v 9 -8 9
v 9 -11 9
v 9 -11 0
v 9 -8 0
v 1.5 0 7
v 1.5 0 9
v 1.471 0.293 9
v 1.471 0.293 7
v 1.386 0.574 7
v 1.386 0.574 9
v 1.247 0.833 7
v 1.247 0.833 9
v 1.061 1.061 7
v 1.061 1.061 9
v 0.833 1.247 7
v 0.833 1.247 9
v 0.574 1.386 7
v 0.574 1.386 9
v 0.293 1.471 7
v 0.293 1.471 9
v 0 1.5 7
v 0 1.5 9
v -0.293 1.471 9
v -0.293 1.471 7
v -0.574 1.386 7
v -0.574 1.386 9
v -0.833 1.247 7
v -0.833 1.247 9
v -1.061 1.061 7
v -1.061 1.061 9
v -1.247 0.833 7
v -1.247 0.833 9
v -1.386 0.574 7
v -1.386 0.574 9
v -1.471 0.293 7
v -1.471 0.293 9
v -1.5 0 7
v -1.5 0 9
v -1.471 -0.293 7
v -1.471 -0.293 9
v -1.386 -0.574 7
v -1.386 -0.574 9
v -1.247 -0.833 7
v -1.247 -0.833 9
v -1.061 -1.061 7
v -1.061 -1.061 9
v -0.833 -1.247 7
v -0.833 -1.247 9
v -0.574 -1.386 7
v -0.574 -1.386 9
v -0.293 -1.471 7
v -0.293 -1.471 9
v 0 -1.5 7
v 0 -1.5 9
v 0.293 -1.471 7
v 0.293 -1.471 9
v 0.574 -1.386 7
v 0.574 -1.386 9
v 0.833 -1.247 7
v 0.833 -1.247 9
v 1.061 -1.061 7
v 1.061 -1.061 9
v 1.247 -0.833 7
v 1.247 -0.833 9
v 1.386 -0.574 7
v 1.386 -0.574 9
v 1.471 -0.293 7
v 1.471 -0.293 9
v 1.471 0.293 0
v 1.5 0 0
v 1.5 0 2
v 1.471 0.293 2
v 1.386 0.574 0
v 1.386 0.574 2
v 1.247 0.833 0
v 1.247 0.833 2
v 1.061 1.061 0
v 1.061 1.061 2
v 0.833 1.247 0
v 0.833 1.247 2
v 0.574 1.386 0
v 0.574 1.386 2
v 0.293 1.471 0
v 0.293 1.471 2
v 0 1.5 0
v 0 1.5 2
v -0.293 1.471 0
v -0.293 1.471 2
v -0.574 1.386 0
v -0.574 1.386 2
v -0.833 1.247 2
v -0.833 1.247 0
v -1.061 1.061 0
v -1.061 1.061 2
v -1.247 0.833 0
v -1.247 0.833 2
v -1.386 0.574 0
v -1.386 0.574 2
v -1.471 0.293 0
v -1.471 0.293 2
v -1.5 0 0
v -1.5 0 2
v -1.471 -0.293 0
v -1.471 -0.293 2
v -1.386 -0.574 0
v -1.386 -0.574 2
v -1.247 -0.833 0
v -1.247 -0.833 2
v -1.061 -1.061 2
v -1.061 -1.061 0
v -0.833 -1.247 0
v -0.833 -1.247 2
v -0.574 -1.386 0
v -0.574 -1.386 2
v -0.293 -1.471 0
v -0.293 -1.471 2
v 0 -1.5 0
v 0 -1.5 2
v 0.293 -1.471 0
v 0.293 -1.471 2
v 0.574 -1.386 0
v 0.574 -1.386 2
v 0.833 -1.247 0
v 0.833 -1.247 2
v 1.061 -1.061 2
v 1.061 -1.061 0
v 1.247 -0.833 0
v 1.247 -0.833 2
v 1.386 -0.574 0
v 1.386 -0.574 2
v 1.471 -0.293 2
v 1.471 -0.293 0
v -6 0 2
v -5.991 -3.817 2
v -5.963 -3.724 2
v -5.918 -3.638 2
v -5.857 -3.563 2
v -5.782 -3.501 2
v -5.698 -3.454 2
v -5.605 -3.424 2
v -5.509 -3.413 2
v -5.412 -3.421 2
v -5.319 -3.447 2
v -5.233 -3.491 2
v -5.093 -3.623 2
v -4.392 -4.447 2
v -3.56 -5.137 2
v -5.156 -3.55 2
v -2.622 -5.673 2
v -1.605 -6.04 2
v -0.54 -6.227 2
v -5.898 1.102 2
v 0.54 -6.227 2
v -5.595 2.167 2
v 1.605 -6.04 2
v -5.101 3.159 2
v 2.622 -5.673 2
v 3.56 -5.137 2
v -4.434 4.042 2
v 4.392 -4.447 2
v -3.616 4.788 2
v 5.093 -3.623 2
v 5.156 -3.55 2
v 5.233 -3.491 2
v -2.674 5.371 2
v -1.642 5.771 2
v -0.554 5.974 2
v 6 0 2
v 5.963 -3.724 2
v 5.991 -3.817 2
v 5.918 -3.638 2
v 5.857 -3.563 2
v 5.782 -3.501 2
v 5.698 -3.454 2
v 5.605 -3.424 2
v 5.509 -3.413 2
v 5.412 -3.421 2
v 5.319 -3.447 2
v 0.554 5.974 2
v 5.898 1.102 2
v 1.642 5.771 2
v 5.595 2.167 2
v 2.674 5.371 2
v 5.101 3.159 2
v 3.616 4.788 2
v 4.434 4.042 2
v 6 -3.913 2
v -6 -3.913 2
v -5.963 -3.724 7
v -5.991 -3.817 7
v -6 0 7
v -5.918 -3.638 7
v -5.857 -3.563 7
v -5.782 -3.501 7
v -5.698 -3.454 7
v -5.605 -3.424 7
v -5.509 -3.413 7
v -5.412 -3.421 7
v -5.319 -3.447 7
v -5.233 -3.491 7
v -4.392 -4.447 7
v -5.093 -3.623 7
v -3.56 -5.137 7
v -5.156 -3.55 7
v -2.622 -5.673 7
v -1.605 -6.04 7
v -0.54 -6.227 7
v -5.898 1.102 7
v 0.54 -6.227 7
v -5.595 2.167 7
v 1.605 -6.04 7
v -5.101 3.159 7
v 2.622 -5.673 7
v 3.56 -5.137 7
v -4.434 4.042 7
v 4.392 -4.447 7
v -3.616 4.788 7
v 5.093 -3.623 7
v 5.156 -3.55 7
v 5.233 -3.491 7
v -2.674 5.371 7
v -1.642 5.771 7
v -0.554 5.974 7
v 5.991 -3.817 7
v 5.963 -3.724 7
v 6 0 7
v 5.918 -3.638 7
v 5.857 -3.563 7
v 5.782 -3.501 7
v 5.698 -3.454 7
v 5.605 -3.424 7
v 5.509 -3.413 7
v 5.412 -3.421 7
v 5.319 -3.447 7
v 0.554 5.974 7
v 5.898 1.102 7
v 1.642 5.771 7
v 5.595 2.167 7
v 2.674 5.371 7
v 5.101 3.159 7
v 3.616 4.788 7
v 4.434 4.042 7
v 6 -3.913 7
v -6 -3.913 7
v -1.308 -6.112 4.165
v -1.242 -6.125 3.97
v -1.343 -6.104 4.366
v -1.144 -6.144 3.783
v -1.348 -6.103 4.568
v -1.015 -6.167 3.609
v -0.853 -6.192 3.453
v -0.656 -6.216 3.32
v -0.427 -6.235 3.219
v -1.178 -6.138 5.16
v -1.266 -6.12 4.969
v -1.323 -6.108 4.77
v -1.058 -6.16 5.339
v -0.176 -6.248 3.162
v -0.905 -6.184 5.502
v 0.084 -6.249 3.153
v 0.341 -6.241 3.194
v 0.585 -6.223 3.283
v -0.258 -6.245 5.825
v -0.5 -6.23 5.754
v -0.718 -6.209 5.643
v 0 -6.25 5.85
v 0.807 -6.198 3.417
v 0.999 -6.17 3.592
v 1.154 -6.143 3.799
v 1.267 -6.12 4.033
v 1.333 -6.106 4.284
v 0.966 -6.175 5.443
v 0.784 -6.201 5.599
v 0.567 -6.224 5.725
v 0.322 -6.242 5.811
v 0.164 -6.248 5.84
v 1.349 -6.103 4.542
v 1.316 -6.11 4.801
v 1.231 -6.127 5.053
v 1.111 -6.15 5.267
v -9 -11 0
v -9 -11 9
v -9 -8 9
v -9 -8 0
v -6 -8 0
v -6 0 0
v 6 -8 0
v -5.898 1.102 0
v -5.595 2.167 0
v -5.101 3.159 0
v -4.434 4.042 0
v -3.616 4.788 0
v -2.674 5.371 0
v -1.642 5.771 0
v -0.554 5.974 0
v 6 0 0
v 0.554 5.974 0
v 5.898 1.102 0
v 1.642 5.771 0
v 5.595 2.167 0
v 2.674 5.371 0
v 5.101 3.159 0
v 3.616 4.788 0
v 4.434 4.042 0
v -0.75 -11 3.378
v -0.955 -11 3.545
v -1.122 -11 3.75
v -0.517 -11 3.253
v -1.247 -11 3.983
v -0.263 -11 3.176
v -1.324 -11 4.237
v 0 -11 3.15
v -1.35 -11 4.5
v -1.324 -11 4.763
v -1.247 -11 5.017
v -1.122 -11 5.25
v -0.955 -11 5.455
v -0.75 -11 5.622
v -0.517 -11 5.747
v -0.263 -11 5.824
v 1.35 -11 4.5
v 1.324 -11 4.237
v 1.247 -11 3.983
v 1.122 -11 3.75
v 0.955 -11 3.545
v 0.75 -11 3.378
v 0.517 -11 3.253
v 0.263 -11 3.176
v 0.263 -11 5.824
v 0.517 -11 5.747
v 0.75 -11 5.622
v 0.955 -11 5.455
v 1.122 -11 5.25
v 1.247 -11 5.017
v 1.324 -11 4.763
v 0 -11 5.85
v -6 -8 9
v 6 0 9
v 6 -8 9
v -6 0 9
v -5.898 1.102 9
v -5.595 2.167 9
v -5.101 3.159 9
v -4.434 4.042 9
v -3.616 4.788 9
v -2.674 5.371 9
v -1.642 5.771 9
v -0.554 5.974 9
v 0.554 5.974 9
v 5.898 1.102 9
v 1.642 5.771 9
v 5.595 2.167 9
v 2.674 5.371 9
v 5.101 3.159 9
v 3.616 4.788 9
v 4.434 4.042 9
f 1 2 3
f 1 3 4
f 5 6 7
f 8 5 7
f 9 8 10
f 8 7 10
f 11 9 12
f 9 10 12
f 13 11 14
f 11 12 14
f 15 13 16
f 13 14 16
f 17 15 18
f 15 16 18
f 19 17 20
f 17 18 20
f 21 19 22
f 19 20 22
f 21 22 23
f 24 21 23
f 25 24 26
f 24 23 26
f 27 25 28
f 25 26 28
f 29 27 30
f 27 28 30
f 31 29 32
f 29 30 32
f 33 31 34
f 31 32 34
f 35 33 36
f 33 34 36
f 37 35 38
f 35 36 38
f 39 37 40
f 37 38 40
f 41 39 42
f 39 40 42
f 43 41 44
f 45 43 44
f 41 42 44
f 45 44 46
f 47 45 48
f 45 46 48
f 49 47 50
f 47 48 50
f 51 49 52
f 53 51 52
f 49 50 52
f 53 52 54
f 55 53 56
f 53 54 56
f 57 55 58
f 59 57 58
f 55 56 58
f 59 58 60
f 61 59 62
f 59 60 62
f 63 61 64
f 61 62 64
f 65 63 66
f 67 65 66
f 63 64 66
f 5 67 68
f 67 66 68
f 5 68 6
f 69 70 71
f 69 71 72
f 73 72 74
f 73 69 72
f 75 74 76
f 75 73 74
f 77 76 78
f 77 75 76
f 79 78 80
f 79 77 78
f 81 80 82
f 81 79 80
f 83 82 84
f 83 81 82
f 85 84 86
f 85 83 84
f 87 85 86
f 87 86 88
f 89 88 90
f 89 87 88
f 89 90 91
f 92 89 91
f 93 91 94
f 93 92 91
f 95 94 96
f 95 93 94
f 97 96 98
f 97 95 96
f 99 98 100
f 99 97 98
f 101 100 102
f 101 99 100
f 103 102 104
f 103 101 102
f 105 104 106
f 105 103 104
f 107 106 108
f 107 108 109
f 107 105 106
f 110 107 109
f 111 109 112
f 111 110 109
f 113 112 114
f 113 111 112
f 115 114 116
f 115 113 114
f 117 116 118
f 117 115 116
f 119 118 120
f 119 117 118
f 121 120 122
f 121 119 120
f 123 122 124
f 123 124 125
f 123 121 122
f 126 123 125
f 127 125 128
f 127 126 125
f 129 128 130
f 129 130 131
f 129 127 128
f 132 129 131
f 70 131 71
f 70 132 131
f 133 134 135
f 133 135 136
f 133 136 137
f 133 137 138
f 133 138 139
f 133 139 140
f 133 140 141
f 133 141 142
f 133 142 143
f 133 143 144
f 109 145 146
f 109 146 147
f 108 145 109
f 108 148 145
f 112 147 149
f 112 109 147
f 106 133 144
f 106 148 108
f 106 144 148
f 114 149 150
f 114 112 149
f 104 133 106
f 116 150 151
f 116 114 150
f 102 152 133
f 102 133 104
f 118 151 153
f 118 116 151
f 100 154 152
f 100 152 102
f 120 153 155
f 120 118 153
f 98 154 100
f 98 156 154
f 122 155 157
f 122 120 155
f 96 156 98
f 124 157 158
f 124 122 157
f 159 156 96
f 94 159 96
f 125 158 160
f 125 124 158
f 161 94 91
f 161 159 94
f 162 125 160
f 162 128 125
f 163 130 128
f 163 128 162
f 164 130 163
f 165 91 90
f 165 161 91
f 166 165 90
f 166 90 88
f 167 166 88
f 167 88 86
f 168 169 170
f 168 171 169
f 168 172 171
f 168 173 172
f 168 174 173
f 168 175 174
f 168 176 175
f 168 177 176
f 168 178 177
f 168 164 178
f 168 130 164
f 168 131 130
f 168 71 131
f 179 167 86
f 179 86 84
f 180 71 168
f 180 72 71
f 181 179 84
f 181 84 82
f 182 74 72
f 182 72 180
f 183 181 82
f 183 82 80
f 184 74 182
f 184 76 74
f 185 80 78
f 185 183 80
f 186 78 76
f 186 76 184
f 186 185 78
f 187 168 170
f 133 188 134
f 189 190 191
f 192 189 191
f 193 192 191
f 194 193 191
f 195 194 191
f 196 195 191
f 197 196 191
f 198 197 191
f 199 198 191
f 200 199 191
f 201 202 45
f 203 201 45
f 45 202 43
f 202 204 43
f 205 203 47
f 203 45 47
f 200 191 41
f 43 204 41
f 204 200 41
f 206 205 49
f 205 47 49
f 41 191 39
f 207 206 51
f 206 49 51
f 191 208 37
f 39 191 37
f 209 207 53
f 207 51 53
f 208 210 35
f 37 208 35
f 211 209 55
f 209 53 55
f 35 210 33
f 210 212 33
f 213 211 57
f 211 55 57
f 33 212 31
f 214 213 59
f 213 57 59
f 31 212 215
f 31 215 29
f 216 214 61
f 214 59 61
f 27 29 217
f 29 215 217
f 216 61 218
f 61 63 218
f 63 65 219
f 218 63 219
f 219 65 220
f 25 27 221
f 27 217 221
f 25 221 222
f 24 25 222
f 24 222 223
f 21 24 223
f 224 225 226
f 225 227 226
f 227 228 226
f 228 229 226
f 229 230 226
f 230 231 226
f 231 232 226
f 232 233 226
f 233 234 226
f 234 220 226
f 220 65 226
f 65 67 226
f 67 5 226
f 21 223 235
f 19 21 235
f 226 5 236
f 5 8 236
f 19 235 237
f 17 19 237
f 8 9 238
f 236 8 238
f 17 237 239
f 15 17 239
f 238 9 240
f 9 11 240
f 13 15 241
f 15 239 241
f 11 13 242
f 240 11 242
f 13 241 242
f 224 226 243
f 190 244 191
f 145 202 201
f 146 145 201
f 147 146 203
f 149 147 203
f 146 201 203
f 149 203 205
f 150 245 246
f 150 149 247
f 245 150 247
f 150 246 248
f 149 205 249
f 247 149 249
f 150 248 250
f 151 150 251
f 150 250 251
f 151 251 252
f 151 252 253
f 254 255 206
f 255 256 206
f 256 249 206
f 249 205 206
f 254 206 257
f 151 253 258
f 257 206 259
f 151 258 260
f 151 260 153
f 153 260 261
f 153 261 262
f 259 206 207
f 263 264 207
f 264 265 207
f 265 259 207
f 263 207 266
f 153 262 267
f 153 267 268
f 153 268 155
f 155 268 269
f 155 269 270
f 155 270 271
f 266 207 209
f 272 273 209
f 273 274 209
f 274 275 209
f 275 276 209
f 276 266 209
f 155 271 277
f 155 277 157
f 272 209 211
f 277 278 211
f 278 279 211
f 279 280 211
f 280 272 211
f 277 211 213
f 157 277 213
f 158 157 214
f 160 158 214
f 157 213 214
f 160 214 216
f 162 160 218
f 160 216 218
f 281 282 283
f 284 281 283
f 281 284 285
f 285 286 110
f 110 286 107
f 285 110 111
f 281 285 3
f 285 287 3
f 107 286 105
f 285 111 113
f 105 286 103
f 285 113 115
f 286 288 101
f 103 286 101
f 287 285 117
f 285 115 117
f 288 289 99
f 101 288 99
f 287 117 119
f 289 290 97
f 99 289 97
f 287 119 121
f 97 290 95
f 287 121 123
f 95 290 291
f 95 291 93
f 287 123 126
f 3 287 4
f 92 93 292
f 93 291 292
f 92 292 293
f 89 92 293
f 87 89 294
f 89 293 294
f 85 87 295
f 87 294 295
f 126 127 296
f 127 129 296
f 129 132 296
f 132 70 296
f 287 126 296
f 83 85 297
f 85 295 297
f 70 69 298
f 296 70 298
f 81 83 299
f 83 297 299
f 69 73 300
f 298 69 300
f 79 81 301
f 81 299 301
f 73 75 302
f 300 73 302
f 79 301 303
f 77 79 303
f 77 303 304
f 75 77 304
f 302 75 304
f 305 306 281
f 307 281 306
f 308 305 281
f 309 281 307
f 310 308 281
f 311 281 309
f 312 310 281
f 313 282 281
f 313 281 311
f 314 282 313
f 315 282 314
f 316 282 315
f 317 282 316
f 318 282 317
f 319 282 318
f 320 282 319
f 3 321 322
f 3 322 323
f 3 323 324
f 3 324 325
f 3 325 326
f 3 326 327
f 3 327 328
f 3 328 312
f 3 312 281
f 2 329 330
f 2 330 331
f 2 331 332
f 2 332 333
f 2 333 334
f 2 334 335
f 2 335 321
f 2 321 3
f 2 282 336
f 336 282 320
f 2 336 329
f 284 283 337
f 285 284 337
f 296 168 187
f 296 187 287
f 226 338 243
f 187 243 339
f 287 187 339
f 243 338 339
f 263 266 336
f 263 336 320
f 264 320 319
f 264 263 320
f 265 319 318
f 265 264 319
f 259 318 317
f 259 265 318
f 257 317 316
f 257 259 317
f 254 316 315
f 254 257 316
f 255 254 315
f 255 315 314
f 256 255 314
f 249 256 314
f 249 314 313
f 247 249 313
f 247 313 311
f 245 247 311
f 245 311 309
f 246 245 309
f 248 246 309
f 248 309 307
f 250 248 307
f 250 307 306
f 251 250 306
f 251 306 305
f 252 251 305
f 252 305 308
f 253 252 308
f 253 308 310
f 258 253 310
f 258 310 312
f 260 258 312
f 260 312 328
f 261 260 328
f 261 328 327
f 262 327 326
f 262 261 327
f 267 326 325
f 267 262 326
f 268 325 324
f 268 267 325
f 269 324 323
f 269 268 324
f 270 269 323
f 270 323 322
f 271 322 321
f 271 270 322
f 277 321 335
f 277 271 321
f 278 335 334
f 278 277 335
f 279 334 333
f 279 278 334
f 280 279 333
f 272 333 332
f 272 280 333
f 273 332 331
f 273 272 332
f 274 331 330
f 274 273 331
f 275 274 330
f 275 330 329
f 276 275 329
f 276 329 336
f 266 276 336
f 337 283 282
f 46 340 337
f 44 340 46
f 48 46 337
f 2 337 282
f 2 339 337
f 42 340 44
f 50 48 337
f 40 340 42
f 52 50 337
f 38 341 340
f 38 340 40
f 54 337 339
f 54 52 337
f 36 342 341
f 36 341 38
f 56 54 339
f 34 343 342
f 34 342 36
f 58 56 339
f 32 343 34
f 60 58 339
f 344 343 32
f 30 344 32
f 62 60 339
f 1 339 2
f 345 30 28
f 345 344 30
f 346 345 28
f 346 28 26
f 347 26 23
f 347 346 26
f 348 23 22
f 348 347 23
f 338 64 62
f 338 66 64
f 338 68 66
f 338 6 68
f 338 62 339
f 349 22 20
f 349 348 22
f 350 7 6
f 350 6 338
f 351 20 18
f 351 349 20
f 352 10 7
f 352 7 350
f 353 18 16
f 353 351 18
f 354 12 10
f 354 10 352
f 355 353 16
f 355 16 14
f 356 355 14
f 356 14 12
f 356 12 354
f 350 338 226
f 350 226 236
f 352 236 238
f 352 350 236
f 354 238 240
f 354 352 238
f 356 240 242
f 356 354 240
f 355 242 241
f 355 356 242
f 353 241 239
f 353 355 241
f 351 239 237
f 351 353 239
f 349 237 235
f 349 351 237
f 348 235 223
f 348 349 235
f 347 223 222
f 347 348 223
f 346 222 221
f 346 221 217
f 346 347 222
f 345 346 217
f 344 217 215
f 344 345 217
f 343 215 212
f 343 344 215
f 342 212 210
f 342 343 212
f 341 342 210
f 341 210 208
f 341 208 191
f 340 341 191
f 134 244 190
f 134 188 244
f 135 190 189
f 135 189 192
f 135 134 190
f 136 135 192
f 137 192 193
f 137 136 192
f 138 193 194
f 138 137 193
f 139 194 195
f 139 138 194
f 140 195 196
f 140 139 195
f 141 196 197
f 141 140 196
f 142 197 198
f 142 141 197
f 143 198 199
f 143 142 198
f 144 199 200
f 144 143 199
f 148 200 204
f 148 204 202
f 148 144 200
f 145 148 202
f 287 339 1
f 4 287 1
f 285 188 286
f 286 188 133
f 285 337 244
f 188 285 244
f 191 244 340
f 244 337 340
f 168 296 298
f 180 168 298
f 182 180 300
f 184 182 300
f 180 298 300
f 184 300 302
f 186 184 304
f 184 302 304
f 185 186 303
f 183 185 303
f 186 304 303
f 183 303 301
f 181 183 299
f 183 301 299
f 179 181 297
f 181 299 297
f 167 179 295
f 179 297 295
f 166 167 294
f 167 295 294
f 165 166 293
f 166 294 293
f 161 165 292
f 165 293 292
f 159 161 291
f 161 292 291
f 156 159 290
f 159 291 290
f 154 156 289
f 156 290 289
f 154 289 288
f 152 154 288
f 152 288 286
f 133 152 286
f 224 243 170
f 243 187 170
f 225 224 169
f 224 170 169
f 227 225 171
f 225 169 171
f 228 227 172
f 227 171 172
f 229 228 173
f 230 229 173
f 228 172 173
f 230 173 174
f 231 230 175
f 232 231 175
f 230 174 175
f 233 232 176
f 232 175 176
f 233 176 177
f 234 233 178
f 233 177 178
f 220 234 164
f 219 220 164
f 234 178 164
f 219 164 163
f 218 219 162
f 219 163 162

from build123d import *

# Parameters (mm, degrees)
SKETCH_1_R               = 1.5
EXTRUDE_1_DEPTH          = 2
SKETCH_2_W               = 18
SKETCH_2_H               = 3
EXTRUDE_2_DEPTH          = 2.5
EXTRUDE_3_DEPTH          = 2.5
FILLET_1_R               = 0.5
FILLET_2_R               = 0.5
CUT_EXTRUDE_1_DEPTH      = 22.236760582
CUT_EXTRUDE_1_DEPTH_BACK = 10
SKETCH_6_R               = 1.35


with BuildPart() as part:
    # 草图1 → 凸台-拉伸1 (new body)
    with BuildSketch(Plane.XY):
        with BuildLine():
            Line((-6, 0), (-6, -8))
            Line((-6, -8), (-9, -8))
            Line((-9, -8), (-9, -11))
            Line((-9, -11), (9, -11))
            Line((9, -11), (9, -8))
            Line((9, -8), (6, -8))
            Line((6, -8), (6, 0))
            ThreePointArc((6, 0), (0, 6), (-6, 0))
        make_face()
        Circle(SKETCH_1_R, mode=Mode.SUBTRACT)
    extrude(amount=EXTRUDE_1_DEPTH)

    # 草图2 → 凸台-拉伸2 (add)
    with BuildSketch(Plane.XY.offset(2)):
        with Locations((0, -9.5)):
            Rectangle(SKETCH_2_W, SKETCH_2_H)
    extrude(amount=EXTRUDE_2_DEPTH)

    # 草图5 → 凸台-拉伸3 (add)
    with BuildSketch(Plane.XY.offset(2)):
        with BuildLine():
            Line((6, -1.75), (6, -8))
            Line((6, -8), (-6, -8))
            Line((-6, -8), (-6, -1.75))
            ThreePointArc((-6, -1.75), (0, -6.25), (6, -1.75))
        make_face()
    extrude(amount=EXTRUDE_3_DEPTH)

    # 圆角1
    fillet_1_edges = [part.edges().sort_by_distance(p)[0] for p in [
        (-6, -1.75, 3.25),
    ]]
    fillet(fillet_1_edges, radius=FILLET_1_R)

    # 圆角2
    fillet_2_edges = [part.edges().sort_by_distance(p)[0] for p in [
        (6, -1.75, 3.25),
    ]]
    fillet(fillet_2_edges, radius=FILLET_2_R)

    # 镜向3: part across plane


with BuildPart() as part_1:
    add(part.part)
    add(part.part.mirror(Plane(origin=(0, 0, 4.5), x_dir=(1, 0, 0), z_dir=(0, 0, -1))))

    # 草图6 → 切除-拉伸1 (cut, two sides: drawn at the far end of the back side and taken through both)
    with BuildSketch(Plane.XZ.offset(11).offset(-CUT_EXTRUDE_1_DEPTH_BACK)):
        with Locations((0, 4.5)):
            Circle(SKETCH_6_R)
    extrude(amount=CUT_EXTRUDE_1_DEPTH + CUT_EXTRUDE_1_DEPTH_BACK, mode=Mode.SUBTRACT)


solid = part_1.part
